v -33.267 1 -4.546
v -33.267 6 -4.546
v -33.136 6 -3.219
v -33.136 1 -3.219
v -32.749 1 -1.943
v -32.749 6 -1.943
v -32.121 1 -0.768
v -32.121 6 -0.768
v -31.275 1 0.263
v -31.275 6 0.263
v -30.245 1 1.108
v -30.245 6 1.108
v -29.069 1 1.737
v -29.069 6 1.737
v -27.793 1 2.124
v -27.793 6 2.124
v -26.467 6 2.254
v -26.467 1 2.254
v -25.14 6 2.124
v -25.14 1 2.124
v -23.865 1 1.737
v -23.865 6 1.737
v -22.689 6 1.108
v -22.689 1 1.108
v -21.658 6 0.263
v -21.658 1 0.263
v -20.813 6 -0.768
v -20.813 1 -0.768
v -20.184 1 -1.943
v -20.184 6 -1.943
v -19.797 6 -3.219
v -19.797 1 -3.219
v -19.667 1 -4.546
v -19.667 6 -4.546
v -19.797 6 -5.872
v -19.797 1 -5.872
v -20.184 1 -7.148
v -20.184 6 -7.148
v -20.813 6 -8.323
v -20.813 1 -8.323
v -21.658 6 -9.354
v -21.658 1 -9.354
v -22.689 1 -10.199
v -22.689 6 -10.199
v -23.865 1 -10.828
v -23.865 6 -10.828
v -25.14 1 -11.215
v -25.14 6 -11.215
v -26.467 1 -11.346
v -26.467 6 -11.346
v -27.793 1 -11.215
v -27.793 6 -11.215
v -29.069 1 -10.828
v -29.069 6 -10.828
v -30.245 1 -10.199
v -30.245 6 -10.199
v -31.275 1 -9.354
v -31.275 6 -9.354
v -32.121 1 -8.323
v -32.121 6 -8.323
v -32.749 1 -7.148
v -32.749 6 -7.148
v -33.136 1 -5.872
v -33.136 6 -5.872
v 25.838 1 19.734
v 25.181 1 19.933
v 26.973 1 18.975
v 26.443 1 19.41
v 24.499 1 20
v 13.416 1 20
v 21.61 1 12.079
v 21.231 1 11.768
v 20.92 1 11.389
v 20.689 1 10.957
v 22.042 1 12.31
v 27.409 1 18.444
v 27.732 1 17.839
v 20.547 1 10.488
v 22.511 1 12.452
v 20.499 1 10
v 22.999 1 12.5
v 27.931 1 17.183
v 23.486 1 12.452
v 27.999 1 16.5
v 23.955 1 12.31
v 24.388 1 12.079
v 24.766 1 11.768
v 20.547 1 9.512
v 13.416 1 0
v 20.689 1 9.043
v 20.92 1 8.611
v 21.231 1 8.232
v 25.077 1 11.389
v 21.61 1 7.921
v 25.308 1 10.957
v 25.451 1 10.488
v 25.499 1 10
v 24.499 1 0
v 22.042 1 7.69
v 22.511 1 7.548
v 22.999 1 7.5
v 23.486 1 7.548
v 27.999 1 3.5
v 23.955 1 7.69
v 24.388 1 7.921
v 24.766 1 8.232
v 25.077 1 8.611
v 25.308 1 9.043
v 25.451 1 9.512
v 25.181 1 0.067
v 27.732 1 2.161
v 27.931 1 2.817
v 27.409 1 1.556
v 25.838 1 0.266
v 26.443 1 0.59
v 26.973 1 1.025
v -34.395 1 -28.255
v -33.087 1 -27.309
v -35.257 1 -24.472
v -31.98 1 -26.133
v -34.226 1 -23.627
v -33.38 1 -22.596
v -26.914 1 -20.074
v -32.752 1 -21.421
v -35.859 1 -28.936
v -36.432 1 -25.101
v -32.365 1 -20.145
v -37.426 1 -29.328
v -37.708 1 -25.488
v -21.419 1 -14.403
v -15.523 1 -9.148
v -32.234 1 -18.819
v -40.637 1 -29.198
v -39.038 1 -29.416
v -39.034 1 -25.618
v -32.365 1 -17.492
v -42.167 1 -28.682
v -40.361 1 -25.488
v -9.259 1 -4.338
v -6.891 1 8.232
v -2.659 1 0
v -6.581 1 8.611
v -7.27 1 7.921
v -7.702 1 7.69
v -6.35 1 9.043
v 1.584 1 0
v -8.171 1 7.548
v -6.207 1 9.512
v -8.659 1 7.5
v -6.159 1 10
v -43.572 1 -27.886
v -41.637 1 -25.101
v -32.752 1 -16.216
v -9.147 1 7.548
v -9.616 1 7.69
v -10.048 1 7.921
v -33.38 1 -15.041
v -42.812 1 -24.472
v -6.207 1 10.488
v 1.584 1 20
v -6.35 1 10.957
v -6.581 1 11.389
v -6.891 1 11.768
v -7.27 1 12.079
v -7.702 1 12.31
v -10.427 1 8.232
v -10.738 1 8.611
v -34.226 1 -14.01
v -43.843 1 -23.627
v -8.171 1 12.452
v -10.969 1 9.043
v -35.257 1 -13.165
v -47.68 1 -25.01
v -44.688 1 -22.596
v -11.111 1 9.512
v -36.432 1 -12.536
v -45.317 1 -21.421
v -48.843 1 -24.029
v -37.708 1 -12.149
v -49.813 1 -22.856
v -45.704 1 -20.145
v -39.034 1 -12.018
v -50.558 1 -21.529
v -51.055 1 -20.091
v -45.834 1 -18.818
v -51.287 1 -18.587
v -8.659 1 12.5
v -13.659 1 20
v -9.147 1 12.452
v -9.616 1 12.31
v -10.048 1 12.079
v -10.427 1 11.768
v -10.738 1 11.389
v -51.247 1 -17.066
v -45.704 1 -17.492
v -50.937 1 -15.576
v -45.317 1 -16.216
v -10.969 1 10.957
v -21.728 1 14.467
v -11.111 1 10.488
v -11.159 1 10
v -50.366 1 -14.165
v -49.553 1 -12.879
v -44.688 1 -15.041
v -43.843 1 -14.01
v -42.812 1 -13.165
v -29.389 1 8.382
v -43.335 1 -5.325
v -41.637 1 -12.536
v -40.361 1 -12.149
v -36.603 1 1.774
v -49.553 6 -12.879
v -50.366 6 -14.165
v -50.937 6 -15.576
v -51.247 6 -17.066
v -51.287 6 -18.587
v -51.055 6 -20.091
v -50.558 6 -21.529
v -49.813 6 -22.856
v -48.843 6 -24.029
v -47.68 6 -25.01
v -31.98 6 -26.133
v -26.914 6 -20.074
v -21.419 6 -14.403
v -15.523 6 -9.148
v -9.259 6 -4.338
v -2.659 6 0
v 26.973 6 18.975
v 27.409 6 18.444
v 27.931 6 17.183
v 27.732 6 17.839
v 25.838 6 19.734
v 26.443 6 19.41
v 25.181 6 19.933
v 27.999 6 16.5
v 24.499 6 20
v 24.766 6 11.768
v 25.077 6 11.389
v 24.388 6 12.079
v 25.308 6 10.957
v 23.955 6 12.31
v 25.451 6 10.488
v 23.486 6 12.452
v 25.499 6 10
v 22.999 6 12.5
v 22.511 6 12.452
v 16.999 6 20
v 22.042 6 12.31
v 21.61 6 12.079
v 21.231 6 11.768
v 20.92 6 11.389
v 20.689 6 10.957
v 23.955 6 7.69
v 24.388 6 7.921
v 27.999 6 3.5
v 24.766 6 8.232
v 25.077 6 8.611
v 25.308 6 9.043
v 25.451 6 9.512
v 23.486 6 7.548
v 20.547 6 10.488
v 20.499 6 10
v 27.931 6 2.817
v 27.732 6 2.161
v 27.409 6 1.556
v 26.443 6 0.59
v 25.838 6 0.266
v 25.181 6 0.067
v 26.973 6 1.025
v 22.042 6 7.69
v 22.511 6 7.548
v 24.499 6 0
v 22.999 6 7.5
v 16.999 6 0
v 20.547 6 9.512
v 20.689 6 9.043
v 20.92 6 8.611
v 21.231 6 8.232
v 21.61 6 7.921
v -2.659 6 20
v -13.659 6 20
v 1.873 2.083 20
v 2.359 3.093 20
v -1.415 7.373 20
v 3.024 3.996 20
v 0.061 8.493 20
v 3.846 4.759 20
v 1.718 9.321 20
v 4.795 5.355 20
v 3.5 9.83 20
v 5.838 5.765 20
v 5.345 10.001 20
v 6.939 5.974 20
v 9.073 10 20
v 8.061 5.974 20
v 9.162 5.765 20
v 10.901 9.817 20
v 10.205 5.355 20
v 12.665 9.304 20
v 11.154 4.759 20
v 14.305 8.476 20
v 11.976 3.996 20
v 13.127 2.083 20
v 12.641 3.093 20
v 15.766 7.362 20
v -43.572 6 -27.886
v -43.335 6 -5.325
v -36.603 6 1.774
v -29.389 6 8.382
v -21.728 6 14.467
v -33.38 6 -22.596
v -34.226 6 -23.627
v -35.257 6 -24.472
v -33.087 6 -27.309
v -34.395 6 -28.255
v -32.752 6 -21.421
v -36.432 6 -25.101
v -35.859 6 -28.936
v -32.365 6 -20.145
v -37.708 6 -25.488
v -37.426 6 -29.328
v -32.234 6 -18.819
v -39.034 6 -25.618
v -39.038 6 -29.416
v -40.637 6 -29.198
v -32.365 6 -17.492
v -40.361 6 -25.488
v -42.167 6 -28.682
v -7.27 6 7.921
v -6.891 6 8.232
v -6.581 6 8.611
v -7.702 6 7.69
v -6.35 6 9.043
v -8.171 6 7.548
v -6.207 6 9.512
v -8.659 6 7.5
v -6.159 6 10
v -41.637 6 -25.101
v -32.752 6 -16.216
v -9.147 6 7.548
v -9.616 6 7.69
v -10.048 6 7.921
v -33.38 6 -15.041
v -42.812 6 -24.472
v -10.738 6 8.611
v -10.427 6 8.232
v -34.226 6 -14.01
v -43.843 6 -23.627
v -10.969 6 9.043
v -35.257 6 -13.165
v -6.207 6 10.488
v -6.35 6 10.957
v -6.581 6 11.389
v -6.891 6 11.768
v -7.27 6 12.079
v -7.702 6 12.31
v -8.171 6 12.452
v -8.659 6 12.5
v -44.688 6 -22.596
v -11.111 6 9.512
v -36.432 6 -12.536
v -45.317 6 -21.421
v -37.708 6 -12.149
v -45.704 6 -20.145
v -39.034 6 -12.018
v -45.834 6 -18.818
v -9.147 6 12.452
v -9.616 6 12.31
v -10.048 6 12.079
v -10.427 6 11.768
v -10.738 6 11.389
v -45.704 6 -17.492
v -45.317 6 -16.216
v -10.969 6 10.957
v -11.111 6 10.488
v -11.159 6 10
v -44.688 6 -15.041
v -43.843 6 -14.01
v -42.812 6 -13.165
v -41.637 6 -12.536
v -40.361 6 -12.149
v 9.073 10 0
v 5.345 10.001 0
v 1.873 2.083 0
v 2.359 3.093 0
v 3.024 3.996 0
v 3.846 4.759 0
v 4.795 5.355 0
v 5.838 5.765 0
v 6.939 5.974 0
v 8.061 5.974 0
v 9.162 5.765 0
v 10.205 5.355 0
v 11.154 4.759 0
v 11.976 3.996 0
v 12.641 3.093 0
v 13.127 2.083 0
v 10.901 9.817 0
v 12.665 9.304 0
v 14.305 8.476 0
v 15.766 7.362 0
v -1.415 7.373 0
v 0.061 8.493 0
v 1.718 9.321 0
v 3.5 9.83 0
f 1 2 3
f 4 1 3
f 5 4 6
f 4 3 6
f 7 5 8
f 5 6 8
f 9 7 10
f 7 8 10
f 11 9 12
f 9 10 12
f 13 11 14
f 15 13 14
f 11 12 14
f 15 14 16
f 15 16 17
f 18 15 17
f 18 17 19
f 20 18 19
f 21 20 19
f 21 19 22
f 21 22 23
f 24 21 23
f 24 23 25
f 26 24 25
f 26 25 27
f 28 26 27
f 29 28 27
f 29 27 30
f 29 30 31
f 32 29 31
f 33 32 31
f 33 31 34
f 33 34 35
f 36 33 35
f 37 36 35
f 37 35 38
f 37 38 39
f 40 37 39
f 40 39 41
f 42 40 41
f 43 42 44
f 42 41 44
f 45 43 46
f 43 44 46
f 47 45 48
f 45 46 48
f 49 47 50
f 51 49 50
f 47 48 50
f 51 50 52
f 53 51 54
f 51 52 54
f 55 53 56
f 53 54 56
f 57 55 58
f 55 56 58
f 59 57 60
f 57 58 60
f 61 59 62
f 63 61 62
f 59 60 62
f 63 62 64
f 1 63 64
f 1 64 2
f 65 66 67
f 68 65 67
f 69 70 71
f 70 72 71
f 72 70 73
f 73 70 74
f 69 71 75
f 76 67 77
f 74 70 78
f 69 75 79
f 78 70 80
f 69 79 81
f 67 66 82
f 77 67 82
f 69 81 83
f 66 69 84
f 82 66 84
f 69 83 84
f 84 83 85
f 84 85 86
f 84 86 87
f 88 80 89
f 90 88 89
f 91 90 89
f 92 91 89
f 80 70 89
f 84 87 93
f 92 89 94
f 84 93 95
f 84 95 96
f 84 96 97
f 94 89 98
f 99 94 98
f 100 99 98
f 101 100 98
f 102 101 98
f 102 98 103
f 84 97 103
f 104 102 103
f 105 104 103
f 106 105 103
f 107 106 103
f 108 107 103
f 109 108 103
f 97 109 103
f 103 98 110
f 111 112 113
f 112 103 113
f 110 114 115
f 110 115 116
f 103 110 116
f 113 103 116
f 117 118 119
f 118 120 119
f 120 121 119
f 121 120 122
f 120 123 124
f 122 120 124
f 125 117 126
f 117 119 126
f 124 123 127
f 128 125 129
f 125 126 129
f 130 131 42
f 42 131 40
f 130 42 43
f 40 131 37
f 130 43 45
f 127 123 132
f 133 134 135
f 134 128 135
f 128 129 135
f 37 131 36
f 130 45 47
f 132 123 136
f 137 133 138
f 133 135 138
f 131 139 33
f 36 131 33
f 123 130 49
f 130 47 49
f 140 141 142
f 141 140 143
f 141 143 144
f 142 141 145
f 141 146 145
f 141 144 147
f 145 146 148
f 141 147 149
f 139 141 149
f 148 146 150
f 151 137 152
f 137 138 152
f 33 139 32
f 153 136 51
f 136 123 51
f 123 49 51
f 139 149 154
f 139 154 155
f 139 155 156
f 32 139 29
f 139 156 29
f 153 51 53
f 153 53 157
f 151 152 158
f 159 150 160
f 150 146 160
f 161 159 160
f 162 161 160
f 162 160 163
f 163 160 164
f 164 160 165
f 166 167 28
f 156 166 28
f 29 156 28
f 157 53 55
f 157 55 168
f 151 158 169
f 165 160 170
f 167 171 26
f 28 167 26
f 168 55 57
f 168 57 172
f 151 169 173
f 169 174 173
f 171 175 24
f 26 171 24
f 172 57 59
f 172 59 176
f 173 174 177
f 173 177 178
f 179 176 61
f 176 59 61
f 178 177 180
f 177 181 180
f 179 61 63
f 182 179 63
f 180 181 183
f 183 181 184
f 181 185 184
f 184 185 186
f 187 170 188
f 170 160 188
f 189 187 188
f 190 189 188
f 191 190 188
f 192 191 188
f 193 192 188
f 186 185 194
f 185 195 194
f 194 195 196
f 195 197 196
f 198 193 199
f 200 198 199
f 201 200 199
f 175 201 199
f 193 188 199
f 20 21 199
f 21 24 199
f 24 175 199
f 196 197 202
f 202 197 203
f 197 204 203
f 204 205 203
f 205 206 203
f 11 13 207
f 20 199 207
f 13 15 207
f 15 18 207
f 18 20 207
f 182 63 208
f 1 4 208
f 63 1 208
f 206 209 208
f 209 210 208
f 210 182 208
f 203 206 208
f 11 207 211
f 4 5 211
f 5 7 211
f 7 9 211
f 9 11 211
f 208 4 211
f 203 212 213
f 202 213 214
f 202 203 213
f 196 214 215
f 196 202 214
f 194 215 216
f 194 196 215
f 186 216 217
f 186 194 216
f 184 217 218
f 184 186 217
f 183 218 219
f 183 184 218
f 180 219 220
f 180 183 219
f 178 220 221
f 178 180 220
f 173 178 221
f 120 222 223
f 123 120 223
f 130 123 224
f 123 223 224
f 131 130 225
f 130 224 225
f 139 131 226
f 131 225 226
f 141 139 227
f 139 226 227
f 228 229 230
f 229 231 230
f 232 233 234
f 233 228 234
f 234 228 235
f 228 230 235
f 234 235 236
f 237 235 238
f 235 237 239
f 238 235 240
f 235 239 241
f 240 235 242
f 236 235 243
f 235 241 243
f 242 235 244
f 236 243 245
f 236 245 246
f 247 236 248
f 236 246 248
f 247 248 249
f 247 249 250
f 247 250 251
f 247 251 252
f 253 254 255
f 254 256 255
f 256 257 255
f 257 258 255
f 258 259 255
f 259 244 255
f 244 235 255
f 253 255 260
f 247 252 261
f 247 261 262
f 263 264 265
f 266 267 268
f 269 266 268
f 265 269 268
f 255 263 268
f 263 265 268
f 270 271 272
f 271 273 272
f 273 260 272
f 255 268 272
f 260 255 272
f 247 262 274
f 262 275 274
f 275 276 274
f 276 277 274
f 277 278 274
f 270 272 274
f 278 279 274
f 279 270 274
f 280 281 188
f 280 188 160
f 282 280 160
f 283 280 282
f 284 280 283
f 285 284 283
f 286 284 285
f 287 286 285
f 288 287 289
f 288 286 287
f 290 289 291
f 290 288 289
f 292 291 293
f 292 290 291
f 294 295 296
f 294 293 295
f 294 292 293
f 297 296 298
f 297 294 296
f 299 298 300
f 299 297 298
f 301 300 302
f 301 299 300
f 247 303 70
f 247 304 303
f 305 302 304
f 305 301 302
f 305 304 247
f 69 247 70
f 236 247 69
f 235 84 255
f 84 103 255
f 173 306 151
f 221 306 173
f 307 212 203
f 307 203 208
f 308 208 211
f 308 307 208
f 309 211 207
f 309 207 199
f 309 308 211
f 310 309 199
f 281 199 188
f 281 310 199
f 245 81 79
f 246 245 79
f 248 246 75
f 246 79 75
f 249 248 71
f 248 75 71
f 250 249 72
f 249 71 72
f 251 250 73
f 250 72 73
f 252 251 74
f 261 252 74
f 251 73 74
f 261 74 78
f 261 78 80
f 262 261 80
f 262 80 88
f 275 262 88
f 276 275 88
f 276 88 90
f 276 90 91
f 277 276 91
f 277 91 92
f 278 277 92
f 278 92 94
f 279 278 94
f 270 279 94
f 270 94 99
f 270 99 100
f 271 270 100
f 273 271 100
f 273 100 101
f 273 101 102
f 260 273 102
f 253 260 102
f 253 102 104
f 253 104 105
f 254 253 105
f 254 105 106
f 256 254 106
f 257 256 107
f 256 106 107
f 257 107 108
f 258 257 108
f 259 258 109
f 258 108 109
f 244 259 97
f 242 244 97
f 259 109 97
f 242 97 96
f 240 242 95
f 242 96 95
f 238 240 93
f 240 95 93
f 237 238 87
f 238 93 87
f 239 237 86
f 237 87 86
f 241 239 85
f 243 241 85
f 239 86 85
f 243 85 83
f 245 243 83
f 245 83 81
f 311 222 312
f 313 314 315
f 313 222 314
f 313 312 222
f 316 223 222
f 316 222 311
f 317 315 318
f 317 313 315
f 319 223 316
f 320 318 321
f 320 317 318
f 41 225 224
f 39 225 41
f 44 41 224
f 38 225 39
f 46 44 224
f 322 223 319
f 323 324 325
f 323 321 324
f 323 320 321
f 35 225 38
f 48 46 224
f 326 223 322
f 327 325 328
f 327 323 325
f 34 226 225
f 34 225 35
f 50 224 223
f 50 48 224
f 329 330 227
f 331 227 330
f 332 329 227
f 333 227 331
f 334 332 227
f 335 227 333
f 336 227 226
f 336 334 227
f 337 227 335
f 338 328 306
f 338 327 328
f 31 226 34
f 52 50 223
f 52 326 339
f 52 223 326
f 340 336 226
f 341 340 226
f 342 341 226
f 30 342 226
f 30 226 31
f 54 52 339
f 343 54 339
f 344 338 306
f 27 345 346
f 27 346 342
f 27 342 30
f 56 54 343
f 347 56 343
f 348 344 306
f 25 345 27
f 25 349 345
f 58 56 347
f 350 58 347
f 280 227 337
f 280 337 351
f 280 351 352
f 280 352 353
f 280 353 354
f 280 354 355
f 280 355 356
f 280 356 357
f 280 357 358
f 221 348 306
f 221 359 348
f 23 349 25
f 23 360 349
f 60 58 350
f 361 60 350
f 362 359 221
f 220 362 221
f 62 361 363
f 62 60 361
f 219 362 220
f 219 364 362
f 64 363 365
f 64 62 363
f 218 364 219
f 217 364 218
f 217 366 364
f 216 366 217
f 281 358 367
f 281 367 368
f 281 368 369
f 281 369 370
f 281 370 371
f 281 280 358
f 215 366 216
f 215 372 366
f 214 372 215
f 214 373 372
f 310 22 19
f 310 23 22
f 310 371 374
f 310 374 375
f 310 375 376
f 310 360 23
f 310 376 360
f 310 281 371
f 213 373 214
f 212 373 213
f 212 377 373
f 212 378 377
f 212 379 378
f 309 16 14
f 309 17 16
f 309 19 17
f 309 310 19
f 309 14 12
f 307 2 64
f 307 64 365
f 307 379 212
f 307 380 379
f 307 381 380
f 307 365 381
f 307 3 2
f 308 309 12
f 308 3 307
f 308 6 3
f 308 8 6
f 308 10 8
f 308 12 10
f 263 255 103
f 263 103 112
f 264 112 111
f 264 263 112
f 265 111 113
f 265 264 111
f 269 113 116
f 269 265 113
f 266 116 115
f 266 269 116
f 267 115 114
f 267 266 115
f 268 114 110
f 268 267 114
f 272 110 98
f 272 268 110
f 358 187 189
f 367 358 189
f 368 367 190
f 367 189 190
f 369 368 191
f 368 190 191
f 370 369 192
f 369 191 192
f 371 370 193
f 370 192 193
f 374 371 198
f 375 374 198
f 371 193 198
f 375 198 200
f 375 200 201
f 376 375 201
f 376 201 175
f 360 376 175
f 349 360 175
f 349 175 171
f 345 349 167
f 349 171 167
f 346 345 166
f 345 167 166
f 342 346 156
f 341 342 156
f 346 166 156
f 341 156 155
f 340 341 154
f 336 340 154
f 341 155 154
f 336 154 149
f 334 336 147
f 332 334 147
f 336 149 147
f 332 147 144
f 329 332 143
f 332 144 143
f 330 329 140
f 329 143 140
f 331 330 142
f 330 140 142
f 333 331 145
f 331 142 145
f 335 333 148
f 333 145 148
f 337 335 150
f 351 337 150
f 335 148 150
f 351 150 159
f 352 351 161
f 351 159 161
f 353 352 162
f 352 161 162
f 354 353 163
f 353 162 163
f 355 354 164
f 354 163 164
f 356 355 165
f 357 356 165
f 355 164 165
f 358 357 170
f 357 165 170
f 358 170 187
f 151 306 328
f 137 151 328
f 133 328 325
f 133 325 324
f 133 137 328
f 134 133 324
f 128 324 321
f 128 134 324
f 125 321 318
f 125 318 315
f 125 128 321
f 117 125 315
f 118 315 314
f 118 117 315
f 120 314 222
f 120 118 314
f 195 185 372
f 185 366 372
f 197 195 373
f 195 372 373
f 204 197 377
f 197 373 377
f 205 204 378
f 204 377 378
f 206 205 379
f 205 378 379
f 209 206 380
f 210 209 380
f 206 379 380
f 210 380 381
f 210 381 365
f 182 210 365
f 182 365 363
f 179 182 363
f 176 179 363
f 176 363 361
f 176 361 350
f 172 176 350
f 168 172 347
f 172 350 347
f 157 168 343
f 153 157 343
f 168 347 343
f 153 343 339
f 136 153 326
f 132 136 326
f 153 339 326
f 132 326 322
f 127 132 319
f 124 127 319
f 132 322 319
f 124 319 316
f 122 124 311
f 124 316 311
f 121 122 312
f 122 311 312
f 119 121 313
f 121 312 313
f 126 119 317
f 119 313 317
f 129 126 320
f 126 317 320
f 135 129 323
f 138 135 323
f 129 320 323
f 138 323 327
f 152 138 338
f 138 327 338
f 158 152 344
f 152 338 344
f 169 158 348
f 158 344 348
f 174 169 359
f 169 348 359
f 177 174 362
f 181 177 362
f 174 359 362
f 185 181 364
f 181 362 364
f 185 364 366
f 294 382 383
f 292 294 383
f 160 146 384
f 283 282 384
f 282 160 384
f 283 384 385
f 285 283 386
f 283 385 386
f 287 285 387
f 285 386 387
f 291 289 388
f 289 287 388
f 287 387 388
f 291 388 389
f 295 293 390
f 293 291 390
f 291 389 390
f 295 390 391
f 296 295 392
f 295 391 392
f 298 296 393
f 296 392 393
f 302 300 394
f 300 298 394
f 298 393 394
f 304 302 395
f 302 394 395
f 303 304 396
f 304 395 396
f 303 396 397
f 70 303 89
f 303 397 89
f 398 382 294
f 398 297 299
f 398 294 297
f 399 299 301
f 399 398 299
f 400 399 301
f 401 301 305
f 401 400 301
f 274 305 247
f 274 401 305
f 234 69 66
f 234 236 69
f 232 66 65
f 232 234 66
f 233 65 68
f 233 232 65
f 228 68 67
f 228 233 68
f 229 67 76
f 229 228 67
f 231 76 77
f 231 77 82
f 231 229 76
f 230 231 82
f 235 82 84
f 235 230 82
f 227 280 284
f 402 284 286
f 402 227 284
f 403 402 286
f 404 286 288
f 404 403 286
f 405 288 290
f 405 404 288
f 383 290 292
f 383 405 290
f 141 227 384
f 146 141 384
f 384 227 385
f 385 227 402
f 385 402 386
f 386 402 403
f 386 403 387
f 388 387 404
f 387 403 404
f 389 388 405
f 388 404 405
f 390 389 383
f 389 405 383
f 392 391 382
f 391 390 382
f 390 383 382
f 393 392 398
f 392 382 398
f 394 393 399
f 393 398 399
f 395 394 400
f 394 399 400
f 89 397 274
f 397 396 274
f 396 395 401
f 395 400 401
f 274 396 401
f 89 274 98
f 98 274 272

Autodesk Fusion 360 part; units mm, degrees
sketch "Sketch1" plane through (0, 0, 0) normal (0, 0, 1) x (1, 0, 0)
  line L0 (0, 0) -> (15, 0) construction
  arc A0 (8.9159, -9.9997) -> (9.0729, 9.9997) centre (8.9986, 0) ccw
  line L1 (9.0729, 9.9997) -> (5.3447, 10.0008)
  arc A1 (5.3447, 10.0008) -> (5.3451, -10.0008) centre (5.3418, 0) ccw
  line L2 (5.3451, -10.0008) -> (8.9159, -9.9997)
  line L3 (0.0839, 1) -> (-13.6592, 1)
  line L4 (-13.6592, 1) -> (-13.6592, 6)
  line L5 (-13.6592, 6) -> (-2.6592, 6)
  line L6 (0.0839, 1) -> (27.9986, 1)
  line L7 (27.9986, 1) -> (27.9986, 6)
  line L8 (27.9986, 6) -> (16.9986, 6)
  circle A2 centre (7.5, 0) radius 6
  dimension "d4" = 5
  dimension "d6" = 5
  dimension "d7" = 1
  dimension "d8" = 1
  dimension "d52" = 11
  dimension "d53" = 11
  dimension "d122" = 12
extrude "Extrude1" add sketch "Sketch1" along normal blind 20 contours A0 L1 A1 L3 L6 A2 | A0 L6 L7 L8 | A1 L3 L4 L5
hole "Hole1" at (-8.6592, 6, 10) direction (0, -1, 0) diameter 5 depth 5 tip angle 118
hole "Hole2" at (22.9986, 6, 10) direction (0, -1, 0) diameter 5 depth 5 tip angle 118
fillet "Fillet9" radius 3.5 2 edges at (27.9986, 3.5, 20) (27.9986, 3.5, 0)
sketch "Sketch7" plane through (0, 6, 0) normal (0, 1, 0) x (-1, 0, 0)
  circle A0 centre (8.6592, 10) radius 2.5
  line L0 (2.6592, 0) -> (13.6592, 0)
  line L1 (13.6592, 0) -> (13.6592, 20)
  line L2 (13.6592, 20) -> (2.6592, 20)
  line L3 (2.6592, 20) -> (2.6592, 0)
  line L4 (36.6932, -32.7022) -> (54.7147, -20.0838)
  line L5 (13.6592, 0) -> (2.6592, 0)
  circle A1 centre (39.0344, -18.8185) radius 6.8
  circle A2 centre (26.4668, -4.5455) radius 6.8
  line L6 (45.7039, -26.393) -> (13.6592, 10) construction
  circle A3 centre (39.0344, -18.8185) radius 8.75 construction
  circle A4 centre (26.4668, -4.5455) radius 8.75 construction
  arc A5 (54.7147, -20.0838) -> (13.6592, 20) centre (-60.9979, -97.5341) ccw
  arc A6 (36.6932, -32.7022) -> (2.6592, 0) centre (-53.2733, -92.2713) ccw
  dimension "d109" = 22
  dimension "d111" = 40
  dimension "d112" = 13.6
  dimension "d113" = 13.6
  dimension "d114" = 17.5
  dimension "d115" = 17.5
extrude "Extrude9" add sketch "Sketch7" against normal blind 5 contours L0 L1 L4 L5 A5 A6
fillet "Fillet8" radius 8.5 2 edges at (-54.7147, 3.5, -20.0838) (-36.6932, 3.5, -32.7022)
equation "d6 = d4"
equation "d8 = d7"
